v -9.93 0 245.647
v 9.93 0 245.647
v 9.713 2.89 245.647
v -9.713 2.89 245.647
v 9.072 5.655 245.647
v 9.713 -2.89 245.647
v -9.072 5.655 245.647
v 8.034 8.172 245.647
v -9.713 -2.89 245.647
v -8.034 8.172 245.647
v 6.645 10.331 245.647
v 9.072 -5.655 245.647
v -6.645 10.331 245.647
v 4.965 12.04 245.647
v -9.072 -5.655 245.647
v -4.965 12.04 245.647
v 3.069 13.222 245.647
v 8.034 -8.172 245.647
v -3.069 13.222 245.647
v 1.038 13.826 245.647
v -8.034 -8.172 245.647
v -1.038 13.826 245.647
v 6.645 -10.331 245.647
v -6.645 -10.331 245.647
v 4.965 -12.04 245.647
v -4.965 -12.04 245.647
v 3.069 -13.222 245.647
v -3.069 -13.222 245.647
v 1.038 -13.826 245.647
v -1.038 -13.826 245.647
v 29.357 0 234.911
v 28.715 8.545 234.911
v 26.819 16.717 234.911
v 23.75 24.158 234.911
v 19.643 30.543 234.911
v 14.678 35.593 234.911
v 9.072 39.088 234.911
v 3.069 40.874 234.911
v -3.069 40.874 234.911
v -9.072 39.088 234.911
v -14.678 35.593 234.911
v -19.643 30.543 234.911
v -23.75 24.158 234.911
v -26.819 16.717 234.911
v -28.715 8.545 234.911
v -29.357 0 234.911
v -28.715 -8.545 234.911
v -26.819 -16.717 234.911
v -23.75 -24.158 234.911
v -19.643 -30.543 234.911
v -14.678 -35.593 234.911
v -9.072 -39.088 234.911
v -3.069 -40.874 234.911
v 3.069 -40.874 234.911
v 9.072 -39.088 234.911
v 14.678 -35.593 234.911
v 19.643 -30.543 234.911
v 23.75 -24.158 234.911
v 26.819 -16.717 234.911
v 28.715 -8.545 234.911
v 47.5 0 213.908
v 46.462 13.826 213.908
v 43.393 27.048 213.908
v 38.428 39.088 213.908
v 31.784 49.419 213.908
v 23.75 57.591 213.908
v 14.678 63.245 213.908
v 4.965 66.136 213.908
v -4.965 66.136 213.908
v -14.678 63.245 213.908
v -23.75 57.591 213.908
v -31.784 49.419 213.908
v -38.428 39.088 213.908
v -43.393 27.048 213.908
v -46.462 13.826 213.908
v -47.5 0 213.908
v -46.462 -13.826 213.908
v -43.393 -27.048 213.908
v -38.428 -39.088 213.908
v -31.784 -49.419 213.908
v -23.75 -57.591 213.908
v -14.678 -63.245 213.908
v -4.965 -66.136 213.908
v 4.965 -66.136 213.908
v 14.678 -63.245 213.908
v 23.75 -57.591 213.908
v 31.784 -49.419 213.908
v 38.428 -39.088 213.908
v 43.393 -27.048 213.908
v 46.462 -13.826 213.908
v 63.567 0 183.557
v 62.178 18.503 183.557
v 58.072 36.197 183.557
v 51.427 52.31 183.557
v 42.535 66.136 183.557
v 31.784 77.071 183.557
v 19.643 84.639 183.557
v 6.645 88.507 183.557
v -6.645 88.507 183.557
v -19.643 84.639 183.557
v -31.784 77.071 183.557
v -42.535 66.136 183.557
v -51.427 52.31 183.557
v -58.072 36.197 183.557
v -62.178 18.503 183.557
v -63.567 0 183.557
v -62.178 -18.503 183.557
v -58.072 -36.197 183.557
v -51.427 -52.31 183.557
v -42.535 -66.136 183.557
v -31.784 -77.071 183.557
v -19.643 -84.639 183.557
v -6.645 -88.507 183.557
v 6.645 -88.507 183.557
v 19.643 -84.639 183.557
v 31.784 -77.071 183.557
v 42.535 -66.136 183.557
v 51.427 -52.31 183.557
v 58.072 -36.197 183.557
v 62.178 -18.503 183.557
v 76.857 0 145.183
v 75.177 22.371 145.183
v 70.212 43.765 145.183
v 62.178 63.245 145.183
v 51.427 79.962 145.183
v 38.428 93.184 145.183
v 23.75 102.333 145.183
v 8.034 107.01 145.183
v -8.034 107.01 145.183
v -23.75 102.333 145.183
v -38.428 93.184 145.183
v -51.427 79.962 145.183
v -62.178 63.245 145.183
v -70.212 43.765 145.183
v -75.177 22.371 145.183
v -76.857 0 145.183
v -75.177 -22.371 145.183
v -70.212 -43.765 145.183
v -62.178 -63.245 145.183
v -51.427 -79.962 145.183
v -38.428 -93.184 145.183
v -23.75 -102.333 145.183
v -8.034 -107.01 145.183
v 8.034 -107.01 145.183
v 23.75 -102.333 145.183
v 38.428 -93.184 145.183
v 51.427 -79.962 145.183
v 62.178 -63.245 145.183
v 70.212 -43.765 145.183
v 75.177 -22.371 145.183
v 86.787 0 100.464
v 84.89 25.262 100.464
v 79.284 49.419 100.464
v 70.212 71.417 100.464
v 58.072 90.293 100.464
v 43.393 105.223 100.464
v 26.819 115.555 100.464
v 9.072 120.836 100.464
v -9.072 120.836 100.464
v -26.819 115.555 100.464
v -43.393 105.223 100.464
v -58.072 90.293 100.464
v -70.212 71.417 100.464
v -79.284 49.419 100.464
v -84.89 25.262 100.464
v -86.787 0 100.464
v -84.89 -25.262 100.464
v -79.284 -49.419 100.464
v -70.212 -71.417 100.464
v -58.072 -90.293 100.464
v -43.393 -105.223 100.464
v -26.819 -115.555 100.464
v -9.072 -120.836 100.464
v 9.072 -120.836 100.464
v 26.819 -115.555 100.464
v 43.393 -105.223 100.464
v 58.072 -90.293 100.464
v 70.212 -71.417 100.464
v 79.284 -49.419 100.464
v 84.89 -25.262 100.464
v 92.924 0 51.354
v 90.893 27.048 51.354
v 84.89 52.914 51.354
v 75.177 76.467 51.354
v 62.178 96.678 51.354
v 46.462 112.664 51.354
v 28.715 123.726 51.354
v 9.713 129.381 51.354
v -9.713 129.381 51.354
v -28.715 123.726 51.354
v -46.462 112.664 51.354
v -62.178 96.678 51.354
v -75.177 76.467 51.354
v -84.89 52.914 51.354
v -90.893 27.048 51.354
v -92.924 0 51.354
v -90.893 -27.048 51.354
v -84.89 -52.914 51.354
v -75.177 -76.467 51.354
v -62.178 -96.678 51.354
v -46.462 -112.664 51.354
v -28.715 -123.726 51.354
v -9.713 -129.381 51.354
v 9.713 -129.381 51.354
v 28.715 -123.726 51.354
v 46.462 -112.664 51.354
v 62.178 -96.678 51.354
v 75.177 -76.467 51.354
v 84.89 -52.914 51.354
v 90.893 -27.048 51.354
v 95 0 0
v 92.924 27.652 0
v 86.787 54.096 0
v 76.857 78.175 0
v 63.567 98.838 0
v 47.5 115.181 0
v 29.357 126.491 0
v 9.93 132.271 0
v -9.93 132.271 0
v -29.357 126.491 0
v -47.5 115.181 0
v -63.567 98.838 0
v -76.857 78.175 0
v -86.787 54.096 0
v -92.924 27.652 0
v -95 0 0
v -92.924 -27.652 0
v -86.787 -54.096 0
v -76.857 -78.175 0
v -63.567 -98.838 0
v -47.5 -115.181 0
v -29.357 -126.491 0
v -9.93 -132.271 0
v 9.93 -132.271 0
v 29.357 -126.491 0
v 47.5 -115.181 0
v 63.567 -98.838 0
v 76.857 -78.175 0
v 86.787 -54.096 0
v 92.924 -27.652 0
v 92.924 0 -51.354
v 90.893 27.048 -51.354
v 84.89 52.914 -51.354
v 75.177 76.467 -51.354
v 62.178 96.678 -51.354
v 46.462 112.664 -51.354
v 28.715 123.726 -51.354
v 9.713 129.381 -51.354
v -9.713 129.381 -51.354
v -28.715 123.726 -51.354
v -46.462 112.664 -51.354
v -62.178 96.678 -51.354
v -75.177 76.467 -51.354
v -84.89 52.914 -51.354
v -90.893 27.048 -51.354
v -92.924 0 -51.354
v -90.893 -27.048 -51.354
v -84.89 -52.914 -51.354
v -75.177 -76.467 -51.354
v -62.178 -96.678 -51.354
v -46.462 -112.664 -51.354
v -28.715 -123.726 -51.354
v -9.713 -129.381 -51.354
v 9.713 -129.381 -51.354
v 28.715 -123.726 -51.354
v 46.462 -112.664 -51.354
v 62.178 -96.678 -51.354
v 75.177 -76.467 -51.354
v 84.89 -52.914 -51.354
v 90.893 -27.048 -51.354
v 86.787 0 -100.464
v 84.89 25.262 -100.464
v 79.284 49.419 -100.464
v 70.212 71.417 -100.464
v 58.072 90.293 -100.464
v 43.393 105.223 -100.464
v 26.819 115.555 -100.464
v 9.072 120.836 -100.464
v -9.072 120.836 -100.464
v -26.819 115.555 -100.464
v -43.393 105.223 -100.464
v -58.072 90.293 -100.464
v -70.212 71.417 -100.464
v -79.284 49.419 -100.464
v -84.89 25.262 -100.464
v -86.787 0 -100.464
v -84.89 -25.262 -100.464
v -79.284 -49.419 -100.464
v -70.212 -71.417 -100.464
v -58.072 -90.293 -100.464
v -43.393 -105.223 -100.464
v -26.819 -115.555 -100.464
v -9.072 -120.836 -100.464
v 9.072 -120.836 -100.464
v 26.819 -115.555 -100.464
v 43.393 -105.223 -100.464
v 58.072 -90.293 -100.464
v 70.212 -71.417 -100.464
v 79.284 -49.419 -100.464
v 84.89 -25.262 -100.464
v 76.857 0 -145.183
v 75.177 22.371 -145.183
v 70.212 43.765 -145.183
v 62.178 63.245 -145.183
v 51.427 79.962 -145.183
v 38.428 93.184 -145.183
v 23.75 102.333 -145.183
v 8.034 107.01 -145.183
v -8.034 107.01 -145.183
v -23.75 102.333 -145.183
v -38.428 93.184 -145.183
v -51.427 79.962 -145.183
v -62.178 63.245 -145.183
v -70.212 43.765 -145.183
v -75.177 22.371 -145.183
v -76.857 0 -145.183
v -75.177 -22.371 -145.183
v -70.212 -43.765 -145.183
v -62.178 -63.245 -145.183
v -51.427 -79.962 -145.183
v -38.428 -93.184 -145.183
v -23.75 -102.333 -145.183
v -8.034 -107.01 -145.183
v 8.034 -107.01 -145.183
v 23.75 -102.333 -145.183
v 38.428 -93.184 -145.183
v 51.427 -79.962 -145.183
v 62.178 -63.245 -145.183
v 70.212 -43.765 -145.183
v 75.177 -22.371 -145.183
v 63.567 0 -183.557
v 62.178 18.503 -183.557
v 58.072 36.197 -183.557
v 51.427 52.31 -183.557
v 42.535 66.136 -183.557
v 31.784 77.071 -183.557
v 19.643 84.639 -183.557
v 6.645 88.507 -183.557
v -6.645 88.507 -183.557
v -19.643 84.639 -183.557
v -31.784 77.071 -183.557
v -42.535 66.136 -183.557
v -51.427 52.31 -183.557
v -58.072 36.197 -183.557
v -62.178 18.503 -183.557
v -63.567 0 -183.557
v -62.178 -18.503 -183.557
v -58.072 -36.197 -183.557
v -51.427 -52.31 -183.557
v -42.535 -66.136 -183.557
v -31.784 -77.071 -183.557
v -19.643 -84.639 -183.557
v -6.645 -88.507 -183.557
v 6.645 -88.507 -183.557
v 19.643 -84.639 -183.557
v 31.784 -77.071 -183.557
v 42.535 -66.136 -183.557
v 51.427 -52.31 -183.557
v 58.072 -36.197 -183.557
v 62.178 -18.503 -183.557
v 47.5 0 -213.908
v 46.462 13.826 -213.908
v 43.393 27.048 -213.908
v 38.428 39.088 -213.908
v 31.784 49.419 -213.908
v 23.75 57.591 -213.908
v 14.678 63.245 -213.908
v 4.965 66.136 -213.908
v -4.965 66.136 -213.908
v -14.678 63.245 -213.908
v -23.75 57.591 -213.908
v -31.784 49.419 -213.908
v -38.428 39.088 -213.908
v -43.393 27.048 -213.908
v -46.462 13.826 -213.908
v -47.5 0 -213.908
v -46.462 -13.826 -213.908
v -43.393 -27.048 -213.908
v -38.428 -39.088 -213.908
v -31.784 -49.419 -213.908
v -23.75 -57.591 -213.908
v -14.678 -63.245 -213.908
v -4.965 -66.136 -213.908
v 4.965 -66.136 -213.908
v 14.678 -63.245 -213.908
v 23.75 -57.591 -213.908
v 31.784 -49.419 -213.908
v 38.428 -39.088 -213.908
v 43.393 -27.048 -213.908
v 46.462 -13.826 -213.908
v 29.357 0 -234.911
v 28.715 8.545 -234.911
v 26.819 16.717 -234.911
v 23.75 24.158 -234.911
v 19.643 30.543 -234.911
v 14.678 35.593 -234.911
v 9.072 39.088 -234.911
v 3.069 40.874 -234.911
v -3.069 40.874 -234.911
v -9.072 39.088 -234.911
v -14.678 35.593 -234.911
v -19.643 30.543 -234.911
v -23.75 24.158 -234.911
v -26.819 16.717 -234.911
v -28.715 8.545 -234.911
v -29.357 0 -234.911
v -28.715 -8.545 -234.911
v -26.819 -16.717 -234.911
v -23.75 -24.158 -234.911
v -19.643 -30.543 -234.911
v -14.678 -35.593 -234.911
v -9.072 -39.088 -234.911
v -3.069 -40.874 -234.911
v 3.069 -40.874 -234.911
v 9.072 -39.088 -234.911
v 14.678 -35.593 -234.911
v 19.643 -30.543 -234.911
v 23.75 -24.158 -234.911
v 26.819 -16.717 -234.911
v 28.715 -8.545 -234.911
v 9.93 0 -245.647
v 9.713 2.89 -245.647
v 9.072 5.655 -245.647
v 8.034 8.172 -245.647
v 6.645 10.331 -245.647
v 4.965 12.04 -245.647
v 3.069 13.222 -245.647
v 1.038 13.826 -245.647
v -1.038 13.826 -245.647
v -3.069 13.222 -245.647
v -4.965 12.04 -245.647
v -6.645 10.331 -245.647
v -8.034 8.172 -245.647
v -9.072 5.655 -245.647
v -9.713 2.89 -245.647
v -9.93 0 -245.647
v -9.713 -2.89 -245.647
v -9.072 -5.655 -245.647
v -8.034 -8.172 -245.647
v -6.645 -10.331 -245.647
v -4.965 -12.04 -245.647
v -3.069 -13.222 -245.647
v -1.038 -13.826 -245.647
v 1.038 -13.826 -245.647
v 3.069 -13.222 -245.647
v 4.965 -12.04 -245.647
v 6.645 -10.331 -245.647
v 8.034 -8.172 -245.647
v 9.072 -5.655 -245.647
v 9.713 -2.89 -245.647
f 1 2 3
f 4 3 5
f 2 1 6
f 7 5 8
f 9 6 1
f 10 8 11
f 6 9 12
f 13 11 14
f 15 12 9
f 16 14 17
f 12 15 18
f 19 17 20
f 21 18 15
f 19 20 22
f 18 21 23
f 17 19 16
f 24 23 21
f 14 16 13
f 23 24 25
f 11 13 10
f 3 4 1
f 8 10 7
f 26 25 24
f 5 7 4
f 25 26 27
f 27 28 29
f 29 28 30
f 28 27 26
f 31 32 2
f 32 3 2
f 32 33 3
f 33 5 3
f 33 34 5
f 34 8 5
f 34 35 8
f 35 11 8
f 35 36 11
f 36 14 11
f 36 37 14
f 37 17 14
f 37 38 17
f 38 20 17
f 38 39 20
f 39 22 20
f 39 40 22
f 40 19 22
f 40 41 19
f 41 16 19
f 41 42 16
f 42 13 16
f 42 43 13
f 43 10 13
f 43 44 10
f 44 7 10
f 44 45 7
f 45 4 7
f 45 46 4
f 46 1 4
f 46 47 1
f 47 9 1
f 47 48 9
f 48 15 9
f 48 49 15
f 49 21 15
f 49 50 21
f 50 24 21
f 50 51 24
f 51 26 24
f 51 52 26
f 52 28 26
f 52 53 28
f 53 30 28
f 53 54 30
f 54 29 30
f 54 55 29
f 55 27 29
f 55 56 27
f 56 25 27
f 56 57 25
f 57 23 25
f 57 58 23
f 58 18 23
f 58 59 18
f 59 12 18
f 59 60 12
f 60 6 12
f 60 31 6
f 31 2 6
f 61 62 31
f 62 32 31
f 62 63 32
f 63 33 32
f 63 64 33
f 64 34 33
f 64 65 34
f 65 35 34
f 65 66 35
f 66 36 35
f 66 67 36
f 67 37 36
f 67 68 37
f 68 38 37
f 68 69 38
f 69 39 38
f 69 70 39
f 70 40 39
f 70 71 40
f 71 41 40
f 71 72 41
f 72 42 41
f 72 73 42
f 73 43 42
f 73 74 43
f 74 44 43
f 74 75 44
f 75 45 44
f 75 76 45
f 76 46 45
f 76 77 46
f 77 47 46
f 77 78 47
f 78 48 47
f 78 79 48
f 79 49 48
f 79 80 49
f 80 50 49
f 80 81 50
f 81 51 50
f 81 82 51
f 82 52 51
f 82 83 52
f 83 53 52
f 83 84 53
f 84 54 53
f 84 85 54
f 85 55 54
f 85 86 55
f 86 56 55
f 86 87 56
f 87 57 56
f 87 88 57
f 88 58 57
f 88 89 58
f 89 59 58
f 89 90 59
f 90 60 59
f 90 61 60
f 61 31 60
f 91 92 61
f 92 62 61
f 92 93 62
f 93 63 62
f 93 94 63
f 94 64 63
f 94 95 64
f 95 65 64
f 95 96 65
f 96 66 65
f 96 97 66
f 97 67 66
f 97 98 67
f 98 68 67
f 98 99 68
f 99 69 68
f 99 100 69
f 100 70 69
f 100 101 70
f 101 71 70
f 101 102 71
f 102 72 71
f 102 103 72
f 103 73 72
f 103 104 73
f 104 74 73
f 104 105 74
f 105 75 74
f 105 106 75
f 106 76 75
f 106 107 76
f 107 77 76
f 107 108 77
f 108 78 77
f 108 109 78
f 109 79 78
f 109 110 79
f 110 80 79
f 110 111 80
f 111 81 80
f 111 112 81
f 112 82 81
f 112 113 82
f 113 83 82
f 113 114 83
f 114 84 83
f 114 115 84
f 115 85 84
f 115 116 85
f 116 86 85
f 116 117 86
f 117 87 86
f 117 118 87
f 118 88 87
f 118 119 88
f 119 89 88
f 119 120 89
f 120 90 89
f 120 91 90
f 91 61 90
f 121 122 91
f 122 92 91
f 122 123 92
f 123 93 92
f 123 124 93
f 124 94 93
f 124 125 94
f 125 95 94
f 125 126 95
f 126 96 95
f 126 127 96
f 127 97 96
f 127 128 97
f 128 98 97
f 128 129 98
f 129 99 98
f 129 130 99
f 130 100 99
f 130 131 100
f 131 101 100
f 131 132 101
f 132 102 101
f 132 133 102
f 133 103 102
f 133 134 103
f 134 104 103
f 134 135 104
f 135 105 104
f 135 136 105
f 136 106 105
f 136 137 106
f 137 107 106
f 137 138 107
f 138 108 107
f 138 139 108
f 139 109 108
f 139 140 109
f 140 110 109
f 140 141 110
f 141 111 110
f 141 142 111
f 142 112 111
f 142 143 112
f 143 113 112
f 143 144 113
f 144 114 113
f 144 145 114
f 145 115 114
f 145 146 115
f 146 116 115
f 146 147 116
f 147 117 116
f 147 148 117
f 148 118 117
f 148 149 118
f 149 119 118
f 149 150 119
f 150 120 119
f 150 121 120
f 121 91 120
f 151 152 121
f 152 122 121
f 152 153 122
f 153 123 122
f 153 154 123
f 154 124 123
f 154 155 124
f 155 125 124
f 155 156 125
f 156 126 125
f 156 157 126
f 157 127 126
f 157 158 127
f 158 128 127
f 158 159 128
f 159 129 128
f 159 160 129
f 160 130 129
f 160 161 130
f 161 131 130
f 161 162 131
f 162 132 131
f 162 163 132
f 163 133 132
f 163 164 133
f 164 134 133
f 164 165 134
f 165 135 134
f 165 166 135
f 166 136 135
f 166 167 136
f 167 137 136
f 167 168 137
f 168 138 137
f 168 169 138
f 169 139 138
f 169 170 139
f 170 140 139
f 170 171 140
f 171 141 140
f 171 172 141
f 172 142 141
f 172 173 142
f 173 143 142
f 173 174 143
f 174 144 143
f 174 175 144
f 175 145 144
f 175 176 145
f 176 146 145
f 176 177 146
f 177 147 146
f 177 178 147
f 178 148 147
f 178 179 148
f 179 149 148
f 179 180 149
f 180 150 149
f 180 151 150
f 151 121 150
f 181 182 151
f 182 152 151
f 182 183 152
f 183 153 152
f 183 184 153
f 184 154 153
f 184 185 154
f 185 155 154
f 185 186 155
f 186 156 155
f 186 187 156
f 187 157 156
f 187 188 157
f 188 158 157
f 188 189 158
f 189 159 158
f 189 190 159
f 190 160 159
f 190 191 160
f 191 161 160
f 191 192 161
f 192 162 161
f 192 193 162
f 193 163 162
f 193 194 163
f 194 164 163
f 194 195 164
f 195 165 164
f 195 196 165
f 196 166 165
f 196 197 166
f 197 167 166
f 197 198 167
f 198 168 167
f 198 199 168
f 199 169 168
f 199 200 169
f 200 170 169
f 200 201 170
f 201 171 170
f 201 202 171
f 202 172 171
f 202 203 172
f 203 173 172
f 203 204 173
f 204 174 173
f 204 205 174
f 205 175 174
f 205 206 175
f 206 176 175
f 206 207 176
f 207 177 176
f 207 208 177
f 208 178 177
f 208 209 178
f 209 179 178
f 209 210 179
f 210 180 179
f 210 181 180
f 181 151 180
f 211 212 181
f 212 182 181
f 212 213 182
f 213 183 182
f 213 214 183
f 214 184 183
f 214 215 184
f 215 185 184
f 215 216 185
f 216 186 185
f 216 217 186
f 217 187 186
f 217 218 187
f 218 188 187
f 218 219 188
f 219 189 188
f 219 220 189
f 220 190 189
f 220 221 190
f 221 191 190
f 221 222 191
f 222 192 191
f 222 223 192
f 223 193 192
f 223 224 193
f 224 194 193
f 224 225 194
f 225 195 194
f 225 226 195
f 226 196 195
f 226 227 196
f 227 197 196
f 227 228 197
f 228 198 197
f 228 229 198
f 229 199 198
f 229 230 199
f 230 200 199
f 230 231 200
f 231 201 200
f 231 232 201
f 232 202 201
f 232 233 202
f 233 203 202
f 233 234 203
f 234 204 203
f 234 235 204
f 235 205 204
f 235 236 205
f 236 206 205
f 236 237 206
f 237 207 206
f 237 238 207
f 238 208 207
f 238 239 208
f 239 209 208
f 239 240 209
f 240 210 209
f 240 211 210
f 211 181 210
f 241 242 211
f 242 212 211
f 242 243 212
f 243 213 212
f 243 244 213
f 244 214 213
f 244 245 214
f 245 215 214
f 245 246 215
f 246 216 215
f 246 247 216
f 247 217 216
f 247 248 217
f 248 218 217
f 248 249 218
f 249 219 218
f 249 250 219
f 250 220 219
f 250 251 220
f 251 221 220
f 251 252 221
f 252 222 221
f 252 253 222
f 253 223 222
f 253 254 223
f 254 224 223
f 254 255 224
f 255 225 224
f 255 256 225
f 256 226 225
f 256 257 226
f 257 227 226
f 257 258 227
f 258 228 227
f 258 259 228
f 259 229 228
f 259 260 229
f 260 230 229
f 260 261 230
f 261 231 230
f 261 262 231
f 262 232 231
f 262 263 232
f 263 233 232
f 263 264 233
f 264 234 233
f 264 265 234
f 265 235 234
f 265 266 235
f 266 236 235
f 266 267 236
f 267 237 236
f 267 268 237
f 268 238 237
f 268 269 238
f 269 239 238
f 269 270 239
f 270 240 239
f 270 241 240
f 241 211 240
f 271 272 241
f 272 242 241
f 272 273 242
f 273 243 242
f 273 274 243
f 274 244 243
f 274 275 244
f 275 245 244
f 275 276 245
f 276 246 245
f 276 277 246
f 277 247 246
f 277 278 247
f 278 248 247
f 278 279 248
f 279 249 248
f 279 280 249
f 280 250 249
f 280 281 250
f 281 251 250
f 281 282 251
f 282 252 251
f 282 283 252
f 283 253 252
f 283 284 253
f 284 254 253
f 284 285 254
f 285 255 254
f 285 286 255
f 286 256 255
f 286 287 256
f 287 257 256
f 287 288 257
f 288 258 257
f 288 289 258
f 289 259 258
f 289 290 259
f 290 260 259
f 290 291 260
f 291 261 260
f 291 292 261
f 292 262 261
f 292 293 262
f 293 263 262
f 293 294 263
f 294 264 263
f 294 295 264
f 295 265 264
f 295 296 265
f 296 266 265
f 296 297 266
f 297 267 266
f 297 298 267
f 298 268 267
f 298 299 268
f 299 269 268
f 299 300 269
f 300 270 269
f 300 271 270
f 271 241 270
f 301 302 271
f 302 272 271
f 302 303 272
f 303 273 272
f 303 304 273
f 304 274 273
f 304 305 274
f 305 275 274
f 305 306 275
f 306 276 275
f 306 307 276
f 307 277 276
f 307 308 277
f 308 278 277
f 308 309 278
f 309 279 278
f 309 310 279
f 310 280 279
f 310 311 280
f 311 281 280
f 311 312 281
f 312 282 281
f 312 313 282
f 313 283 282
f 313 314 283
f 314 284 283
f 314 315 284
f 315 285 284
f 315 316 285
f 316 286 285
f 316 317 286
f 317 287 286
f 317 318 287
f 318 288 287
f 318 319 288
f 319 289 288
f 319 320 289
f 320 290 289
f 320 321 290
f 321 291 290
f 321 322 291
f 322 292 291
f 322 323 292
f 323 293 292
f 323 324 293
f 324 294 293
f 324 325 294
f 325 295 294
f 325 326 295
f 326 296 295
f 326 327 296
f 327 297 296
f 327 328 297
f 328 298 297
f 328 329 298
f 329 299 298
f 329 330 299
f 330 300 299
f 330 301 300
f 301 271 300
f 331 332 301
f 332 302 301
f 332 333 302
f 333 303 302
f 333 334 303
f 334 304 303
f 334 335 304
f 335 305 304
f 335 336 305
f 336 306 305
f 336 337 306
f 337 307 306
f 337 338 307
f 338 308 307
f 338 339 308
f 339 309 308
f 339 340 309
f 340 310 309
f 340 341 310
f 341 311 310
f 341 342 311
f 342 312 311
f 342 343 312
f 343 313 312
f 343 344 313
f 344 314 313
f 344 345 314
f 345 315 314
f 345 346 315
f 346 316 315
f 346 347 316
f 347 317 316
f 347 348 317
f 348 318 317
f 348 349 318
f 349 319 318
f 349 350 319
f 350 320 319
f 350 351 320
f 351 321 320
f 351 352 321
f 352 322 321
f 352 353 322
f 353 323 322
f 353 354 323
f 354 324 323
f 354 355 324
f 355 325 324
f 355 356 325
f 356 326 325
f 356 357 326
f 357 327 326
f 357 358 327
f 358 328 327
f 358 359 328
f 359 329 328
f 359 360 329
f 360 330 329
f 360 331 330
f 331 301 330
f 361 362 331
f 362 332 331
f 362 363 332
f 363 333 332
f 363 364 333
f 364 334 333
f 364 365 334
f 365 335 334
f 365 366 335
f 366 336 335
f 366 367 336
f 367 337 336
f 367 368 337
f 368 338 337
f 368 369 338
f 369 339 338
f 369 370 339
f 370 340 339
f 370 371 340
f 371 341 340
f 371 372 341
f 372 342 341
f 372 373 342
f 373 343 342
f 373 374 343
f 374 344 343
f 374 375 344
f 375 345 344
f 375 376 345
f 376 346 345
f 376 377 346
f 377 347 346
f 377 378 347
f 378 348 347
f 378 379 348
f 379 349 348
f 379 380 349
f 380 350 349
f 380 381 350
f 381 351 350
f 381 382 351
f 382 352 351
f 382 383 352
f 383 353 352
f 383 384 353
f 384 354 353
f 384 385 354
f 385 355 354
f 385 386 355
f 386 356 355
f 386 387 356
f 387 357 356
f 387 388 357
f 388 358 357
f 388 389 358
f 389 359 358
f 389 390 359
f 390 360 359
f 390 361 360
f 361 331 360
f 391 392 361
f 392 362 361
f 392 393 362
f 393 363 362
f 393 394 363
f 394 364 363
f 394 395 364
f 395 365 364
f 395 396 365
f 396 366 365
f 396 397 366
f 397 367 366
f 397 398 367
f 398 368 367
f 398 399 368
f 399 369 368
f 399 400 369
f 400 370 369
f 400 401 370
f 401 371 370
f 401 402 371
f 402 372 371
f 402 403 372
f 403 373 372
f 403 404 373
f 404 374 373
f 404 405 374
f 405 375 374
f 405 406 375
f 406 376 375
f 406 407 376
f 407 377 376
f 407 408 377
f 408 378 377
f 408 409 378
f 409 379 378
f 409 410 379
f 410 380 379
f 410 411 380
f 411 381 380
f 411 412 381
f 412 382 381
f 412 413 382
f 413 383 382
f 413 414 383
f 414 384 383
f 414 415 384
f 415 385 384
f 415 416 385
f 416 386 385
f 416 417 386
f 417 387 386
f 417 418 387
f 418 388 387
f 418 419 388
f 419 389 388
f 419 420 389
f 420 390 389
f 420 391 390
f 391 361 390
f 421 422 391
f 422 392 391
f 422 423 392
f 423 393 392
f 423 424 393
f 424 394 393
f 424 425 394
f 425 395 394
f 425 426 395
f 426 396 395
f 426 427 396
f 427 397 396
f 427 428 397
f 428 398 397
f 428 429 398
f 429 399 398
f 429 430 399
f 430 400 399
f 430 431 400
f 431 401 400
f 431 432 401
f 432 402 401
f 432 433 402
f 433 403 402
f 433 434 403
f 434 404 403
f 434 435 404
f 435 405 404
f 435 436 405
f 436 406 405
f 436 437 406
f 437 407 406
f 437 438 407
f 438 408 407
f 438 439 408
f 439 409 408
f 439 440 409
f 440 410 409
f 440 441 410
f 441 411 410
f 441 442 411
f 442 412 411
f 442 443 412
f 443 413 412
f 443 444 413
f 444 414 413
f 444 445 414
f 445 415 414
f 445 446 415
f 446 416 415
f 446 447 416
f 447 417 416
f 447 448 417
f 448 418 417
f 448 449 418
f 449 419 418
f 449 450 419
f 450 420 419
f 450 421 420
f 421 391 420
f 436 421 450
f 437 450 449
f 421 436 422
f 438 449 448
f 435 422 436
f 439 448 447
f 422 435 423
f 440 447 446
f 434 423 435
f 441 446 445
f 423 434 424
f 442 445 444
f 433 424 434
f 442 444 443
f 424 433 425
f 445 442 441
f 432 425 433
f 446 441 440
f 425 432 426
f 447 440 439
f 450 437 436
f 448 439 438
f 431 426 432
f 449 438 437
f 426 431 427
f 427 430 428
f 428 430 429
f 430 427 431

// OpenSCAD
// Generated by SolidPython 1.0.1 on 2020-07-29 00:39:26


scale(v = [5, 7, 13]) {
	sphere(r = 19);
}
/***********************************************
*********      SolidPython code:      **********
************************************************
 
# import packages: SolidPython
from solid import *
from solid.utils import *
from itertools import chain, combinations


class Resize:

    def __init__(self, scad_file):
        self.scad_file = scad_file
        #self.scad_file = import_scad(scad_file)
        # cone/cylinder param:
        self.r1 = 0
        self.r2 = 0
        self.h = 0
        # rectangular prism param:
        self.w = 0
        self.l = 0
        # ellipse param:
        self.r = 0

    # import OpenScad code (file name corresponds to shape)


    # classify shape + parameters
    def assign(self, param1, param2, param3):
        if self.scad_file == 'cone.scad':
            self.r1 = param1
            self.r2 = param2
            self.h = param3
        elif self.scad_file == 'cylinder.scad':
            self.r1 = param1
            self.r2 = param2
            self.h = param3
        elif self.scad_file == 'rectangularPrism.scad':
            self.h = param1
            self.l = param2
            self.w = param3
        else:
            self.r = param1
            self.h = param2

    # resize parameters
    def iterate(self):
        x = range(3, 20, 2)
        i = 1
        if self.scad_file == 'cone.scad':
            tempList = list(combinations(x, 2))
            for temp in tempList:
                param1 = temp[0]
                param2 = temp[1]
                filepath = 'produced_scad_files/' + 'cone' + str(param1) + '_' + str(param2) + '_' + '.scad'
                scad_render_to_file(cylinder(h=param1, r1=param2, r2=0), filepath)

        elif self.scad_file == 'cylinder.scad':
            tempList = list(combinations(x, 3))
            for temp in tempList:
                param1 = temp[0]
                param2 = temp[1]
                filepath = 'produced_scad_files/' + 'cylinder' + str(param1) + '_' + str(param2) + '_' + '.scad'
                scad_render_to_file(cylinder(h=param1, r1=param2, r2=param2), filepath)

        elif self.scad_file == 'rectangularPrism.scad':
            tempList = list(combinations(x, 3))
            for temp in tempList:
                param1 = temp[0]
                param2 = temp[1]
                param3 = temp[2]
                filepath = 'produced_scad_files/' + 'rectangularPrism' + str(param1) + '_' + str(param2) + '_' + str(
                    param3) + '.scad'
                scad_render_to_file(cube(size=(param1, param2, param3)), filepath)

        elif self.scad_file == 'ellipse.scad':
            tempList = list(combinations(x, 4))
            for temp in tempList:
                param1 = temp[0]
                param2 = temp[1]
                param3 = temp[2]
                param4 = temp[3]
                filepath = 'produced_scad_files/' + 'ellipse' + str(param1) + '_' + str(param2) + '_' + str(param3) + '_' + str(param4) + '.scad'
                scad_render_to_file(scale([param1, param2, param3])(sphere(r=param4)), filepath)

    def render_to_scadfile(self):
        scad_render_to_file(scad, 'example.scad') 
 
************************************************/
